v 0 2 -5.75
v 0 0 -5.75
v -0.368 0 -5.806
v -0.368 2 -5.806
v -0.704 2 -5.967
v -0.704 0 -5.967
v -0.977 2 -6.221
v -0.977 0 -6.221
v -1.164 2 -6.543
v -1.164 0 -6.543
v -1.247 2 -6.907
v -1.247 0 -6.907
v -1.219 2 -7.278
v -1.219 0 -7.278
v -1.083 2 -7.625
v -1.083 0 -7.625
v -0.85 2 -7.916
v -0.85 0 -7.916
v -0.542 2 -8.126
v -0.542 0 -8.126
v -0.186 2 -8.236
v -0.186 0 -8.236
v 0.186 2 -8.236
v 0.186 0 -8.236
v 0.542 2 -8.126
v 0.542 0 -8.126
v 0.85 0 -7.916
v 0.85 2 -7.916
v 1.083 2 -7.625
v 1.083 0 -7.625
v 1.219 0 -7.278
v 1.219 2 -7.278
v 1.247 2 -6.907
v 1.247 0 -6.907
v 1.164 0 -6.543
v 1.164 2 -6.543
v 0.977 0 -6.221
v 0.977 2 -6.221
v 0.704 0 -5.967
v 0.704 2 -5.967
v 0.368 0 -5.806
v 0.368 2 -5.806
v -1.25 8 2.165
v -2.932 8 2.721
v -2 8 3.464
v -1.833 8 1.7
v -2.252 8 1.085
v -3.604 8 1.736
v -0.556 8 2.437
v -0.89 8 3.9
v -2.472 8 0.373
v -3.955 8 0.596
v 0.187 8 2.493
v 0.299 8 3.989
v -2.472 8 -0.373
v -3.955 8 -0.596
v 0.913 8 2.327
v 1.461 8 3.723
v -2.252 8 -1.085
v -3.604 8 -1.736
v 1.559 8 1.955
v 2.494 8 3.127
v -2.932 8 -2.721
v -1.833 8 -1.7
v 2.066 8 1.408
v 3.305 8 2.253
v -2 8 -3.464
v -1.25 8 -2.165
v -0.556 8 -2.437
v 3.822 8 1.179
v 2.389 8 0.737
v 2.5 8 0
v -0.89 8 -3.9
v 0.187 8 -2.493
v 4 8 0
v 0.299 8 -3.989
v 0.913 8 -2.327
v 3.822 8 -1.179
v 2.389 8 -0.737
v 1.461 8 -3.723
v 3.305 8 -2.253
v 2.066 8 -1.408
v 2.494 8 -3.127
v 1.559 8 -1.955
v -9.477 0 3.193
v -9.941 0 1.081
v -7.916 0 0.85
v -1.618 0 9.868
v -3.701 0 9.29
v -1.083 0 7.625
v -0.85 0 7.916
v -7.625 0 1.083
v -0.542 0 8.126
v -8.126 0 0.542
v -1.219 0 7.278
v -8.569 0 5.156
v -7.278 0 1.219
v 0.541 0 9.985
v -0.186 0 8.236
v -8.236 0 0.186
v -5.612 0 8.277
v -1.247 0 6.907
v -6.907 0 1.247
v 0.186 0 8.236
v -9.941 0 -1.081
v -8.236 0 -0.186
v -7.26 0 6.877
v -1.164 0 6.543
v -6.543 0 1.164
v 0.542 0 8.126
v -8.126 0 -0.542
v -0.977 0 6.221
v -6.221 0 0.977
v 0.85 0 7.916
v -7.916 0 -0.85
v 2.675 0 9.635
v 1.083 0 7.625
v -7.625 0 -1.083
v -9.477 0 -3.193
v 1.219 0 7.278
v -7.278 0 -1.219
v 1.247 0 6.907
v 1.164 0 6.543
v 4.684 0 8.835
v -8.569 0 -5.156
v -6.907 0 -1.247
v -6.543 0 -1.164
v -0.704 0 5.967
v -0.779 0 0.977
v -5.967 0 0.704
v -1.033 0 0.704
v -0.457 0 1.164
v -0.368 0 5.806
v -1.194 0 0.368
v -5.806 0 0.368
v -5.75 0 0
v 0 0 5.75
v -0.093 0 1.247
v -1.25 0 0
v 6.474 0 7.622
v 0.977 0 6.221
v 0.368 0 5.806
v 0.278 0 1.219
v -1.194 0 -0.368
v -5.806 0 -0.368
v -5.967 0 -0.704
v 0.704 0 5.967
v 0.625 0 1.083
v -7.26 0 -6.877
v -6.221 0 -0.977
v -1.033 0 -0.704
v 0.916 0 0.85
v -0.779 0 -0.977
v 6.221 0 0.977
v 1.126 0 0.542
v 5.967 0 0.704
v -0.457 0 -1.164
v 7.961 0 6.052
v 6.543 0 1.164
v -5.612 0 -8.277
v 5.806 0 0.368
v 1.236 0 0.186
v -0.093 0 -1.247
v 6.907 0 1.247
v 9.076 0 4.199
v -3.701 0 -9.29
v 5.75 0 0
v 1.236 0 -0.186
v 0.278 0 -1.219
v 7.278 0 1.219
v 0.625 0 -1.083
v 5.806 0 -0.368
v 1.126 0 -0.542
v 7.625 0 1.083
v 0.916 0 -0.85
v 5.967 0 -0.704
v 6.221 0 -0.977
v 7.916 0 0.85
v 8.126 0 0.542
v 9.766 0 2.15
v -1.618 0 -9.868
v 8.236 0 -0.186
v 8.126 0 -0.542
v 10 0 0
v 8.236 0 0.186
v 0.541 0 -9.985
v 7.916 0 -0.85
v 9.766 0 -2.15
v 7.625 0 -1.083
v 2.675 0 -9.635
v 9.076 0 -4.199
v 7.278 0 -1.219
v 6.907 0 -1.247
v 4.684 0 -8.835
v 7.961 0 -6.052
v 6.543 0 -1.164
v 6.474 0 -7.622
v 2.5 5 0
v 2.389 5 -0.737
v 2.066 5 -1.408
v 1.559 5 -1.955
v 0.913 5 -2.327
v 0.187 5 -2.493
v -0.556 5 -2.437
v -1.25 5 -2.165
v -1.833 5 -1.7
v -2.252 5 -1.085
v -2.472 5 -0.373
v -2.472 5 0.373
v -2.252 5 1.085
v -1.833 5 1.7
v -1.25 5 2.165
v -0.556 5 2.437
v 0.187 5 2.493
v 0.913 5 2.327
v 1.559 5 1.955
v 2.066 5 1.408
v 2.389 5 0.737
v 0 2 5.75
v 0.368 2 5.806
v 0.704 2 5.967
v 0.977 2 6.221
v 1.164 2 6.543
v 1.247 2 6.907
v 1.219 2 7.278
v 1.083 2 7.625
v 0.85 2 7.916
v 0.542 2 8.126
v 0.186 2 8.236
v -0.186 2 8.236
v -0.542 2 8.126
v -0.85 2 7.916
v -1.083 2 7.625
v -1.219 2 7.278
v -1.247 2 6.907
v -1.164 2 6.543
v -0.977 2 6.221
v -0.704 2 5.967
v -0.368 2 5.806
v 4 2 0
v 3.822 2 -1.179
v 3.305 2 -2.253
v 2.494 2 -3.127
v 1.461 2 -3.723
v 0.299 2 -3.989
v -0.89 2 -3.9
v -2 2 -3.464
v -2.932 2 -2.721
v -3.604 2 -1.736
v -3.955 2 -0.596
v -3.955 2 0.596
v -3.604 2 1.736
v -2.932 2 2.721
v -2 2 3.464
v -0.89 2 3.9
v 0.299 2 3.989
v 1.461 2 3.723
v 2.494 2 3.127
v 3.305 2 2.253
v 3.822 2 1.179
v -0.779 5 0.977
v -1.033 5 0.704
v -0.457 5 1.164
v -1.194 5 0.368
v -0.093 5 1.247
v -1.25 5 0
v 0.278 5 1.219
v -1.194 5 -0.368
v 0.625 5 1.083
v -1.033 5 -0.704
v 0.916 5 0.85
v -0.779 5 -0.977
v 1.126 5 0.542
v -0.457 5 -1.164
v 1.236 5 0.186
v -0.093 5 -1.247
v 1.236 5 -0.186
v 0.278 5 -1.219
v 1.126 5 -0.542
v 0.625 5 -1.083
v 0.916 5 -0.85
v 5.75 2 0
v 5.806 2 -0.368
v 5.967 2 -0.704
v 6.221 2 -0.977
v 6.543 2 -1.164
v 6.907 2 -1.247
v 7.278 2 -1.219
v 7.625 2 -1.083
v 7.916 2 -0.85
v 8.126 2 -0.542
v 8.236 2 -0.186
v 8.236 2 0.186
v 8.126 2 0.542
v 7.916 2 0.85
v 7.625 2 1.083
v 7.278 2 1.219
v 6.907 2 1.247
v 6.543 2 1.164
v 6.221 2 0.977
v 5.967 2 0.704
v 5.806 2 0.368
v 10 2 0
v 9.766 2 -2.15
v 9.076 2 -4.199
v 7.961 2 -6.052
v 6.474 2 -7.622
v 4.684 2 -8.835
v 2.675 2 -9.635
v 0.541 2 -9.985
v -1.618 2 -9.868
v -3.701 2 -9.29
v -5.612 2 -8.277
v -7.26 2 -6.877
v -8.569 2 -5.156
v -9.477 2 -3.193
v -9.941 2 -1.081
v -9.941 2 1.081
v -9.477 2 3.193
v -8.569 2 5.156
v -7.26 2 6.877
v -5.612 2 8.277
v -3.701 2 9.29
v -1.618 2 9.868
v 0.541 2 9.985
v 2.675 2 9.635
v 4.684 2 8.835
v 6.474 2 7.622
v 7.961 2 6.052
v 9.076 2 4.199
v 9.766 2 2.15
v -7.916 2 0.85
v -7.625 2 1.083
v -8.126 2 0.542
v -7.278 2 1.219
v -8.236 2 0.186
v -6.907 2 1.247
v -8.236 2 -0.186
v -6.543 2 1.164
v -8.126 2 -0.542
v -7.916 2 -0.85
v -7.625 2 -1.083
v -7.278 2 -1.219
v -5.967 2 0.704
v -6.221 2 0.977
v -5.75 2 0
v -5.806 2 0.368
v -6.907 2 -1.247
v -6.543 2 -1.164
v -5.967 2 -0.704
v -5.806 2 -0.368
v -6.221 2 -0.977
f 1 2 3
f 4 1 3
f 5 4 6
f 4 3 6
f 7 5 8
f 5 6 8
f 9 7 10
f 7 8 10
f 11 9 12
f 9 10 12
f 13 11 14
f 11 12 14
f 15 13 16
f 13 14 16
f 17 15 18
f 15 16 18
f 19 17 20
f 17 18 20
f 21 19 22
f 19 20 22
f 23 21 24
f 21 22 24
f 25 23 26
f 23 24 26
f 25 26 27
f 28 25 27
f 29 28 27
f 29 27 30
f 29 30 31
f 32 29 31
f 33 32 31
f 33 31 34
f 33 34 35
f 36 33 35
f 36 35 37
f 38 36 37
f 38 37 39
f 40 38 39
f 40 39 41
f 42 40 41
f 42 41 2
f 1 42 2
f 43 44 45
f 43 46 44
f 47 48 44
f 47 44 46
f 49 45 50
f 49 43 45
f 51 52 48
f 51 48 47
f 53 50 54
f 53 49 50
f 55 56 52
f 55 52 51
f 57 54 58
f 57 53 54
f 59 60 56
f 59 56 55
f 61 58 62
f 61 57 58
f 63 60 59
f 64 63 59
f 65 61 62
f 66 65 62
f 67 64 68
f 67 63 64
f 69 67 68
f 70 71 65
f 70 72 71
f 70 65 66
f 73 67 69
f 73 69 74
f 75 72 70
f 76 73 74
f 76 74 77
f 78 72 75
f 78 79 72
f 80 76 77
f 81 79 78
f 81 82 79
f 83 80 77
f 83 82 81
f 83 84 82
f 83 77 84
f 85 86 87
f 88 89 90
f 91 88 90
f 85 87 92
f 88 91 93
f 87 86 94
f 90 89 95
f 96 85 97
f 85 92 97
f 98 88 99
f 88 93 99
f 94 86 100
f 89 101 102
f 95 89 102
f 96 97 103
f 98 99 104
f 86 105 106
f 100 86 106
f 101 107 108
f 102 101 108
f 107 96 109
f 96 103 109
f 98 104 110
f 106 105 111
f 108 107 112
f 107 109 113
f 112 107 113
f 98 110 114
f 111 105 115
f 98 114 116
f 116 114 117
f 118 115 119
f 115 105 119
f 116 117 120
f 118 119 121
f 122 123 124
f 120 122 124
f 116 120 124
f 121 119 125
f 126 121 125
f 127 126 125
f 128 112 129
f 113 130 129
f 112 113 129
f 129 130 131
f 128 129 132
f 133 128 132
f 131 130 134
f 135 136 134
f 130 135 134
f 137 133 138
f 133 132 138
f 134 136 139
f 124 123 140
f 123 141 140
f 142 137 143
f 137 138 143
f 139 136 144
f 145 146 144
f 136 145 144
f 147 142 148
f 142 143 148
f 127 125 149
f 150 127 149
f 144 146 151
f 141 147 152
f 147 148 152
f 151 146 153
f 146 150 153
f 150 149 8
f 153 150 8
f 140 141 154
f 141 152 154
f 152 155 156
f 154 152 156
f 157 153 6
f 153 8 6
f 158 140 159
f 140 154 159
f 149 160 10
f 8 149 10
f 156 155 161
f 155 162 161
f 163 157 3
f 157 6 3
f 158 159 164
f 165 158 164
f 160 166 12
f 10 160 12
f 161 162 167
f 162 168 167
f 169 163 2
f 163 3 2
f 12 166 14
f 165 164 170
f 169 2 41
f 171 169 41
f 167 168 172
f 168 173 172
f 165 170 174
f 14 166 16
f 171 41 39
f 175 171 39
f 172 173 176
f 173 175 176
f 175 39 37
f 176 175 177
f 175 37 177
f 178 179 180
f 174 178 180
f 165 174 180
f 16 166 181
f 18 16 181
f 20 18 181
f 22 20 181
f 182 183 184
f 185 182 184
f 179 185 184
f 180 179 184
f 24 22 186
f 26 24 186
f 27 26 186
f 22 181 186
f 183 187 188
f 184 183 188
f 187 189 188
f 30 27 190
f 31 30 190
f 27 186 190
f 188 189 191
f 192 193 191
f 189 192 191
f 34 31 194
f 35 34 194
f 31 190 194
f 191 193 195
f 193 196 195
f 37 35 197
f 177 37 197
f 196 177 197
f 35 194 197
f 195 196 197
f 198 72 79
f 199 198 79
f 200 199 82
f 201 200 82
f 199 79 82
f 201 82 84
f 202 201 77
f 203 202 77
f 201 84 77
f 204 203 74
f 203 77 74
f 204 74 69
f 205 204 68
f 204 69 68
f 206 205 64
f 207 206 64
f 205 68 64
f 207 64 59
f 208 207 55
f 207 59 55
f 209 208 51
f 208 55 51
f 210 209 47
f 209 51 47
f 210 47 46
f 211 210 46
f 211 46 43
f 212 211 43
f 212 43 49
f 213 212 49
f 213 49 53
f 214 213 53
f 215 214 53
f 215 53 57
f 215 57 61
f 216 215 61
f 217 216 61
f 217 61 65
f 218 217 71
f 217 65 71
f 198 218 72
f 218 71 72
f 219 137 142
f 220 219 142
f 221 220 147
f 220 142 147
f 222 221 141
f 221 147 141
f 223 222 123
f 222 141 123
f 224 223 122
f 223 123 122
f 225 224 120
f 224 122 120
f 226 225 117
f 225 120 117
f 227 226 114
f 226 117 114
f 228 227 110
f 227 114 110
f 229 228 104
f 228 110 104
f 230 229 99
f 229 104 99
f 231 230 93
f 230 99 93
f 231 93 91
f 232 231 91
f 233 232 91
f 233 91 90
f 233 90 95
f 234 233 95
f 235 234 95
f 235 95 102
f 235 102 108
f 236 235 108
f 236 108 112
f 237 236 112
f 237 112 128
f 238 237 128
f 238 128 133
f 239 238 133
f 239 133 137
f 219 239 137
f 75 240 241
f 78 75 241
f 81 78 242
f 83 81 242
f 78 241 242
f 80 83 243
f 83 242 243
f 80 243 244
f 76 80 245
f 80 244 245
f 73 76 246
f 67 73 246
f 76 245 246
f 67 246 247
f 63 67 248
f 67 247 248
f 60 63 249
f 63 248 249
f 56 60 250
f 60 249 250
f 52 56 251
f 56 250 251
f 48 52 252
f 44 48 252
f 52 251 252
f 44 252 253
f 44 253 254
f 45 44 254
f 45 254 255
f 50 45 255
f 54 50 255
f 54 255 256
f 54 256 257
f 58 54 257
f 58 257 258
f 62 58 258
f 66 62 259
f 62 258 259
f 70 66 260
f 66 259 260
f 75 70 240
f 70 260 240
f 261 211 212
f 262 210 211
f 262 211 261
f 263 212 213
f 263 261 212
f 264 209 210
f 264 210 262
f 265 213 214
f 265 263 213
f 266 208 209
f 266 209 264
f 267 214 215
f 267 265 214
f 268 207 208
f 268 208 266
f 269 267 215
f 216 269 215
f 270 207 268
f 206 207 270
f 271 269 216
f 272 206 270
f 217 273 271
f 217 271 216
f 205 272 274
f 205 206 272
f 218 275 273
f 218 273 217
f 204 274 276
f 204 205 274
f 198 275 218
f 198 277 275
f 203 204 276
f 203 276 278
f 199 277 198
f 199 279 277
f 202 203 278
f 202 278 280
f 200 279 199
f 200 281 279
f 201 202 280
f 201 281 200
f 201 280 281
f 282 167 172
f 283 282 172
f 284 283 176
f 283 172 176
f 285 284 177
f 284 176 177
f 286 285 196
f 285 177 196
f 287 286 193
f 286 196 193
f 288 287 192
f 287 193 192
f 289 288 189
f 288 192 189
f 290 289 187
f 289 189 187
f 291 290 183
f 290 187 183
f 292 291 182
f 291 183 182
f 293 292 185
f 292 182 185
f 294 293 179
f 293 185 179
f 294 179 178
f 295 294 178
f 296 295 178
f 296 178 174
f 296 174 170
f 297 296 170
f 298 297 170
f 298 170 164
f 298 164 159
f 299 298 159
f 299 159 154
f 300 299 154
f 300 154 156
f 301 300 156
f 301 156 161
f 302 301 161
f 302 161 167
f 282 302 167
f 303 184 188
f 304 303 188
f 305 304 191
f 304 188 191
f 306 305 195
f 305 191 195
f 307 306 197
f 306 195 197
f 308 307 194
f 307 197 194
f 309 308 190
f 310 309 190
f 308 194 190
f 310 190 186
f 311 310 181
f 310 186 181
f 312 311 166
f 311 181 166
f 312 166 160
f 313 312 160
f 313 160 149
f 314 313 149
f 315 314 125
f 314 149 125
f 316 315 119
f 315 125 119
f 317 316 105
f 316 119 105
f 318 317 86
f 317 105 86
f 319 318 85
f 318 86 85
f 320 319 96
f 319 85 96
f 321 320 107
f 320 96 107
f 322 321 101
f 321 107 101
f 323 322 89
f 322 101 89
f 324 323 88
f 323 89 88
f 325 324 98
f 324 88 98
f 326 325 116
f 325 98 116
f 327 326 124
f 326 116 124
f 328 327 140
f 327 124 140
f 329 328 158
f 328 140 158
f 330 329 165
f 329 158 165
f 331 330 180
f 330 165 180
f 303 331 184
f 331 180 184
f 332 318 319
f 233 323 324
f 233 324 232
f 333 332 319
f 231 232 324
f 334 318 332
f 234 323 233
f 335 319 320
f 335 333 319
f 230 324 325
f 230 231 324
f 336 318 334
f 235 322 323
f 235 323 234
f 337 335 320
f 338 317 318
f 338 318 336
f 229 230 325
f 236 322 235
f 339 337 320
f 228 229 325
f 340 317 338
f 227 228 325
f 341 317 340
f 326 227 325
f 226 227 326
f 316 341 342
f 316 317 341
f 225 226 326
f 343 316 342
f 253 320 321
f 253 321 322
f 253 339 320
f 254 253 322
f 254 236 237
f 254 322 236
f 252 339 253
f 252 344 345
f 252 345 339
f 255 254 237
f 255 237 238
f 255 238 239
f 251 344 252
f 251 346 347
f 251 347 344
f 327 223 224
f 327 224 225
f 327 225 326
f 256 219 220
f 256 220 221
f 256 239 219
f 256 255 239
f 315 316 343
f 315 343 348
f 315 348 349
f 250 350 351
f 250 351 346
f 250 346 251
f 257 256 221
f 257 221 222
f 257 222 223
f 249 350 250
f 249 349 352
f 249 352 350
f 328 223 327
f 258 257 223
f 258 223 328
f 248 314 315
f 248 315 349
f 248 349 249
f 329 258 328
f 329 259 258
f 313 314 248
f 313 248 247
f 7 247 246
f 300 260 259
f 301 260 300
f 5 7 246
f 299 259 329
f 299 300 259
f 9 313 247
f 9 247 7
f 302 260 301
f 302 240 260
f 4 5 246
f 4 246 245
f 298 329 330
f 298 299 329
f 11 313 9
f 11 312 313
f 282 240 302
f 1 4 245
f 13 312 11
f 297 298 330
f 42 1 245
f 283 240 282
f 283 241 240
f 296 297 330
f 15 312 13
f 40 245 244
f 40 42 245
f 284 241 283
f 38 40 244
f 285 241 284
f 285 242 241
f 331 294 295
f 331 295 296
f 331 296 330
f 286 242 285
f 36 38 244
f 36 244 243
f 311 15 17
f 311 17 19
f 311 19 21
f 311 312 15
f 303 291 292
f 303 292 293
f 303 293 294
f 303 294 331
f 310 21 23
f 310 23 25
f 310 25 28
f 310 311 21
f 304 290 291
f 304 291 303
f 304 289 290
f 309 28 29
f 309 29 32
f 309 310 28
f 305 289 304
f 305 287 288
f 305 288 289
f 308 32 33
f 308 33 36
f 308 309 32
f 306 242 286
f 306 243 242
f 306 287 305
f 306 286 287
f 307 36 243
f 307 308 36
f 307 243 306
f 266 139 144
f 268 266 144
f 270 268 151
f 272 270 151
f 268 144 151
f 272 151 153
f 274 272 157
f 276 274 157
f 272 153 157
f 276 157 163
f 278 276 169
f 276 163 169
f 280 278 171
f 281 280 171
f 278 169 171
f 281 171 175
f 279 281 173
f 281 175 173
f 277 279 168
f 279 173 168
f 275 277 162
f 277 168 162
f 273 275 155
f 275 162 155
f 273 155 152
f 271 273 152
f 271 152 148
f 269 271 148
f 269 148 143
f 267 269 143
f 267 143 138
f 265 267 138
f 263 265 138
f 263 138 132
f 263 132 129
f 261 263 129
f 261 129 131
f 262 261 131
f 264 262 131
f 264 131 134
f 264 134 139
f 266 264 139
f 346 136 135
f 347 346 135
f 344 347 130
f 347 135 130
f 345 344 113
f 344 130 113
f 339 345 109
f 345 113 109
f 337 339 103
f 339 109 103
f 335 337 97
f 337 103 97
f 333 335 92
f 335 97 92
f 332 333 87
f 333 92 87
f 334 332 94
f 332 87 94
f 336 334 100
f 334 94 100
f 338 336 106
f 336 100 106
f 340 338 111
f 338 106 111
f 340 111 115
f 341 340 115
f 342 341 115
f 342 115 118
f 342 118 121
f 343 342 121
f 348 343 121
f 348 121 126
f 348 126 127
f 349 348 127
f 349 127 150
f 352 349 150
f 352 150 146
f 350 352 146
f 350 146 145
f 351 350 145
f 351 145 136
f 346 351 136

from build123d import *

# Parameters (mm, degrees)
SKETCH1_R                       = 10
BOSS_EXTRUDE1_DEPTH             = 2
TAP_DRILL_FOR_M3X0_5_TAP1_D     = 2.5
TAP_DRILL_FOR_M3X0_5_TAP1_DEPTH = 38.1
CIRPATTERN1_COUNT               = 4
SKETCH4_R                       = 4
BOSS_EXTRUDE2_DEPTH             = 6
SKETCH5_R                       = 2.5
CUT_EXTRUDE1_DEPTH              = 3
TAP_DRILL_FOR_M3X0_5_TAP2_D     = 2.5
TAP_DRILL_FOR_M3X0_5_TAP2_DEPTH = 38.1


with BuildPart() as part:
    # Sketch1 → Boss-Extrude1 (new body)
    with BuildSketch(Plane(origin=(0, 0, 0), x_dir=(1, 0, 0), z_dir=(0, 1, 0))):
        Circle(SKETCH1_R)
    extrude(amount=BOSS_EXTRUDE1_DEPTH)

    # Tap Drill for M3x0.5 Tap1
    with Locations(Plane(origin=(0, 2, 0), x_dir=(1, 0, 0), z_dir=(0, 1, 0))):
        with Locations((7, 0)):
            tap_drill_for_m3x0_5_tap1 = Hole(TAP_DRILL_FOR_M3X0_5_TAP1_D / 2, depth=TAP_DRILL_FOR_M3X0_5_TAP1_DEPTH)

    # CirPattern1: Tap Drill for M3x0.5 Tap1 ×4 about axis
    cirpattern1_axis = Axis((0, 2, 0), (0, -1, 0))
    for i in range(1, CIRPATTERN1_COUNT):
        add(tap_drill_for_m3x0_5_tap1.rotate(cirpattern1_axis, i * 360 / CIRPATTERN1_COUNT), mode=Mode.SUBTRACT)

    # Sketch4 → Boss-Extrude2 (add)
    with BuildSketch(Plane(origin=(0, 2, 0), x_dir=(1, 0, 0), z_dir=(0, 1, 0))):
        Circle(SKETCH4_R)
    extrude(amount=BOSS_EXTRUDE2_DEPTH)

    # Sketch5 → Cut-Extrude1 (cut)
    with BuildSketch(Plane(origin=(0, 8, 0), x_dir=(1, 0, 0), z_dir=(0, 1, 0))):
        Circle(SKETCH5_R)
    extrude(amount=-CUT_EXTRUDE1_DEPTH, mode=Mode.SUBTRACT)

    # Tap Drill for M3x0.5 Tap2
    with Locations(Plane(origin=(0, 5, 0), x_dir=(1, 0, 0), z_dir=(0, 1, 0))):
        with Locations((0, 0)):
            Hole(TAP_DRILL_FOR_M3X0_5_TAP2_D / 2, depth=TAP_DRILL_FOR_M3X0_5_TAP2_DEPTH)


solid = part.part
